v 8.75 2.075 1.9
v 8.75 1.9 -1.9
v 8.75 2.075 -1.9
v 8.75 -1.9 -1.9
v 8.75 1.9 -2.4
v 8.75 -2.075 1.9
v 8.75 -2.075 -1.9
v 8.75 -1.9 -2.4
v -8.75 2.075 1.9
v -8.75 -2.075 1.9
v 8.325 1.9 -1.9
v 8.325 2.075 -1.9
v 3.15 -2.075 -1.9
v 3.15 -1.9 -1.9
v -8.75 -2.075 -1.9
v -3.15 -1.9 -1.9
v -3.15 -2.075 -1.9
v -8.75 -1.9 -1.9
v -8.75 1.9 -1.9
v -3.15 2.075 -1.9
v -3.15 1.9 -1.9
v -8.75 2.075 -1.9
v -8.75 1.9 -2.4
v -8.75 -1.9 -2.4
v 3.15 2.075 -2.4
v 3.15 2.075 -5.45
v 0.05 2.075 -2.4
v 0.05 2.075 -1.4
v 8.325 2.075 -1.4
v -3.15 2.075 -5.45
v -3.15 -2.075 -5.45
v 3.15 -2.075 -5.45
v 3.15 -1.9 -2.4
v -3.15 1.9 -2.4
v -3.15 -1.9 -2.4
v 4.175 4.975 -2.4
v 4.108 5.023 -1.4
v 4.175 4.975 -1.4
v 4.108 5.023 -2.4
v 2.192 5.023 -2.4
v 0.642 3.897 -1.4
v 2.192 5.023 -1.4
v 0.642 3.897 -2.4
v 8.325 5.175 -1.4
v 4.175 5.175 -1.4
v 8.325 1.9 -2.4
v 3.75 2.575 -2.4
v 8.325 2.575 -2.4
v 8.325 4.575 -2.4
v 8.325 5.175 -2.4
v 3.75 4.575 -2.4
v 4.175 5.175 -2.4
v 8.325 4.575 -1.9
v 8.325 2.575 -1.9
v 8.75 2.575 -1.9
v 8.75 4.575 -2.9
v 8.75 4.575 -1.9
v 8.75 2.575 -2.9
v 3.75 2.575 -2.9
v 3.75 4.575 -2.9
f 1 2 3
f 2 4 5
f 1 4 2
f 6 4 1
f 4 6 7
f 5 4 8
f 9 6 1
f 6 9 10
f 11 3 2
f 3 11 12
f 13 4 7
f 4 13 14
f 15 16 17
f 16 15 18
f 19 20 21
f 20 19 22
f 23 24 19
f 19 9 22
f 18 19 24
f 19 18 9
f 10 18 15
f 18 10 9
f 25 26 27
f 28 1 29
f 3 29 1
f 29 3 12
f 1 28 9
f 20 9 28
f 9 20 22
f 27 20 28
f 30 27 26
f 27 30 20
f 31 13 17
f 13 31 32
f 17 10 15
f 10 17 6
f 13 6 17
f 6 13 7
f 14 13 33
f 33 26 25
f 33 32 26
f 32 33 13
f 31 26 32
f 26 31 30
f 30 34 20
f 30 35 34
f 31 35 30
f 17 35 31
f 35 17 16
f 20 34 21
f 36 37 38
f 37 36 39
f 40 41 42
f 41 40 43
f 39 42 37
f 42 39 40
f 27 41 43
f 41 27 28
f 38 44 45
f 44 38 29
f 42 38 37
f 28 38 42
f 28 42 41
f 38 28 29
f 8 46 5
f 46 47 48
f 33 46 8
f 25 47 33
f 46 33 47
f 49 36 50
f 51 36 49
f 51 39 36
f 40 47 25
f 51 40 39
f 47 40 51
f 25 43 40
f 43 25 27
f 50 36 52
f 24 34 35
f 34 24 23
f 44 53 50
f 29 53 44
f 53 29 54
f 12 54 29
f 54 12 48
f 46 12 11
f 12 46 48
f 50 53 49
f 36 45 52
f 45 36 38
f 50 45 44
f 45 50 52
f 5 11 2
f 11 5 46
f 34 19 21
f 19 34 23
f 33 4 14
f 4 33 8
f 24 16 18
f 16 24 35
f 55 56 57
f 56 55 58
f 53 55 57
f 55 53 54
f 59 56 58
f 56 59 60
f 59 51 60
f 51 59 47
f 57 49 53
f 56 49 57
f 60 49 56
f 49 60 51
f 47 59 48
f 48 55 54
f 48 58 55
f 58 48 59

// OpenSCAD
// Sharp GP2Y0D413K0F Distance Sensor Outline Model
// Coordinate System: Center of body is (0, 0, 0). +Z is up. +Y is front. Units are mm.

// --- Dimensions based on the provided datasheet outline ---

// Main Body Case Dimensions (Approximate bounding box based on diagram)
main_width = 17.5;         // Total width/length approximation
main_height = 4.15;        // Height approximation
main_depth = 3.8;          // Depth approximation

// Front Protrusion / Lens Case Dimensions (relative to the main body)
protrusion_width = 6.3;    // Width of the front protrusion
protrusion_length = 7.1;   // Length/depth of the front part

// Lens Placement and Size (Based on the diagram's internal structure)
lens_center_x = 0;         // Center alignment assumed at X=0 for simplicity
lens_center_y = protrusion_length / 2 + main_height / 2; // Y position of the front face

// Lens/Window dimensions (approximated based on typical layout and provided reference)
light_lens_radius = 3.1;   // Approximate radius for one lens
receive_lens_width = 4.15; // Approximate width for the receiver area

// PWB Dimensions (Underneath attachment)
pwb_width = main_width;
pwb_depth = main_depth - 0.1; // Allowing minimal space for mounting

// Connector Footprint (3-pin JCTC connection approximation)
connector_size_x = 5;
connector_size_y = 2;


// --- Modeling the Sensor ---

module sharp_sensor() {
    // 1. 本体ケース (Main Body Case - Carbonic ABS, Rectangular block centered at origin)
    color("gray") {
        cube([main_width, main_height, main_depth], center = true);
    }

    // 2. 前面に飛び出すレンズケース (Front Lens Case / Protrusion)
    // This part protrudes forward (+Y direction) and slightly upward/downward depending on exact geometry.
    translate([0, 0, -main_depth / 2]) {
        color("gray") {
            cube([protrusion_width, main_height, protrusion_length], center = true);
        }
    }

    // 3. 発光部レンズ (Light Lens - Circular Window)
    // Positioned on the front face of the protrusion.
    translate([protrusion_width / 2, main_height / 2, -main_depth / 2]) {
        color("cyan") { // Light source approximation
            cylinder(r = light_lens_radius, h = 1, center = true);
        }
    }

    // 4. 受光部レンズ (Receive Lens - Rectangular Window)
    // Positioned on the front face of the protrusion.
    translate([protrusion_width / 2 + light_lens_radius, main_height / 2, -main_depth / 2]) {
        color("yellow") { // Receive area approximation (rectangle)
            cube([receive_lens_width, light_lens_radius * 2, 1], center = true);
        }
    }

    // 5. 下部に取り付けられる PWB (Printed Circuit Board - Thin plate underneath)
    translate([0, 0, -main_depth / 2]) {
        color("darkblue") {
            cube([pwb_width, pwb_depth + 0.1, 1], center = true); // Slightly thicker than the case
        }
    }

    // 6. 底面の 3 ピンコネクタ (3-Pin Connector - Simplified footprint)
    translate([main_width / 2 - connector_size_x/2, main_height / 2 + 1.5, -main_depth / 2 - 0.5]) {
        color("red") {
            cube([connector_size_x, connector_size_y, 1], center = true);
        }
    }
}

sharp_sensor();
